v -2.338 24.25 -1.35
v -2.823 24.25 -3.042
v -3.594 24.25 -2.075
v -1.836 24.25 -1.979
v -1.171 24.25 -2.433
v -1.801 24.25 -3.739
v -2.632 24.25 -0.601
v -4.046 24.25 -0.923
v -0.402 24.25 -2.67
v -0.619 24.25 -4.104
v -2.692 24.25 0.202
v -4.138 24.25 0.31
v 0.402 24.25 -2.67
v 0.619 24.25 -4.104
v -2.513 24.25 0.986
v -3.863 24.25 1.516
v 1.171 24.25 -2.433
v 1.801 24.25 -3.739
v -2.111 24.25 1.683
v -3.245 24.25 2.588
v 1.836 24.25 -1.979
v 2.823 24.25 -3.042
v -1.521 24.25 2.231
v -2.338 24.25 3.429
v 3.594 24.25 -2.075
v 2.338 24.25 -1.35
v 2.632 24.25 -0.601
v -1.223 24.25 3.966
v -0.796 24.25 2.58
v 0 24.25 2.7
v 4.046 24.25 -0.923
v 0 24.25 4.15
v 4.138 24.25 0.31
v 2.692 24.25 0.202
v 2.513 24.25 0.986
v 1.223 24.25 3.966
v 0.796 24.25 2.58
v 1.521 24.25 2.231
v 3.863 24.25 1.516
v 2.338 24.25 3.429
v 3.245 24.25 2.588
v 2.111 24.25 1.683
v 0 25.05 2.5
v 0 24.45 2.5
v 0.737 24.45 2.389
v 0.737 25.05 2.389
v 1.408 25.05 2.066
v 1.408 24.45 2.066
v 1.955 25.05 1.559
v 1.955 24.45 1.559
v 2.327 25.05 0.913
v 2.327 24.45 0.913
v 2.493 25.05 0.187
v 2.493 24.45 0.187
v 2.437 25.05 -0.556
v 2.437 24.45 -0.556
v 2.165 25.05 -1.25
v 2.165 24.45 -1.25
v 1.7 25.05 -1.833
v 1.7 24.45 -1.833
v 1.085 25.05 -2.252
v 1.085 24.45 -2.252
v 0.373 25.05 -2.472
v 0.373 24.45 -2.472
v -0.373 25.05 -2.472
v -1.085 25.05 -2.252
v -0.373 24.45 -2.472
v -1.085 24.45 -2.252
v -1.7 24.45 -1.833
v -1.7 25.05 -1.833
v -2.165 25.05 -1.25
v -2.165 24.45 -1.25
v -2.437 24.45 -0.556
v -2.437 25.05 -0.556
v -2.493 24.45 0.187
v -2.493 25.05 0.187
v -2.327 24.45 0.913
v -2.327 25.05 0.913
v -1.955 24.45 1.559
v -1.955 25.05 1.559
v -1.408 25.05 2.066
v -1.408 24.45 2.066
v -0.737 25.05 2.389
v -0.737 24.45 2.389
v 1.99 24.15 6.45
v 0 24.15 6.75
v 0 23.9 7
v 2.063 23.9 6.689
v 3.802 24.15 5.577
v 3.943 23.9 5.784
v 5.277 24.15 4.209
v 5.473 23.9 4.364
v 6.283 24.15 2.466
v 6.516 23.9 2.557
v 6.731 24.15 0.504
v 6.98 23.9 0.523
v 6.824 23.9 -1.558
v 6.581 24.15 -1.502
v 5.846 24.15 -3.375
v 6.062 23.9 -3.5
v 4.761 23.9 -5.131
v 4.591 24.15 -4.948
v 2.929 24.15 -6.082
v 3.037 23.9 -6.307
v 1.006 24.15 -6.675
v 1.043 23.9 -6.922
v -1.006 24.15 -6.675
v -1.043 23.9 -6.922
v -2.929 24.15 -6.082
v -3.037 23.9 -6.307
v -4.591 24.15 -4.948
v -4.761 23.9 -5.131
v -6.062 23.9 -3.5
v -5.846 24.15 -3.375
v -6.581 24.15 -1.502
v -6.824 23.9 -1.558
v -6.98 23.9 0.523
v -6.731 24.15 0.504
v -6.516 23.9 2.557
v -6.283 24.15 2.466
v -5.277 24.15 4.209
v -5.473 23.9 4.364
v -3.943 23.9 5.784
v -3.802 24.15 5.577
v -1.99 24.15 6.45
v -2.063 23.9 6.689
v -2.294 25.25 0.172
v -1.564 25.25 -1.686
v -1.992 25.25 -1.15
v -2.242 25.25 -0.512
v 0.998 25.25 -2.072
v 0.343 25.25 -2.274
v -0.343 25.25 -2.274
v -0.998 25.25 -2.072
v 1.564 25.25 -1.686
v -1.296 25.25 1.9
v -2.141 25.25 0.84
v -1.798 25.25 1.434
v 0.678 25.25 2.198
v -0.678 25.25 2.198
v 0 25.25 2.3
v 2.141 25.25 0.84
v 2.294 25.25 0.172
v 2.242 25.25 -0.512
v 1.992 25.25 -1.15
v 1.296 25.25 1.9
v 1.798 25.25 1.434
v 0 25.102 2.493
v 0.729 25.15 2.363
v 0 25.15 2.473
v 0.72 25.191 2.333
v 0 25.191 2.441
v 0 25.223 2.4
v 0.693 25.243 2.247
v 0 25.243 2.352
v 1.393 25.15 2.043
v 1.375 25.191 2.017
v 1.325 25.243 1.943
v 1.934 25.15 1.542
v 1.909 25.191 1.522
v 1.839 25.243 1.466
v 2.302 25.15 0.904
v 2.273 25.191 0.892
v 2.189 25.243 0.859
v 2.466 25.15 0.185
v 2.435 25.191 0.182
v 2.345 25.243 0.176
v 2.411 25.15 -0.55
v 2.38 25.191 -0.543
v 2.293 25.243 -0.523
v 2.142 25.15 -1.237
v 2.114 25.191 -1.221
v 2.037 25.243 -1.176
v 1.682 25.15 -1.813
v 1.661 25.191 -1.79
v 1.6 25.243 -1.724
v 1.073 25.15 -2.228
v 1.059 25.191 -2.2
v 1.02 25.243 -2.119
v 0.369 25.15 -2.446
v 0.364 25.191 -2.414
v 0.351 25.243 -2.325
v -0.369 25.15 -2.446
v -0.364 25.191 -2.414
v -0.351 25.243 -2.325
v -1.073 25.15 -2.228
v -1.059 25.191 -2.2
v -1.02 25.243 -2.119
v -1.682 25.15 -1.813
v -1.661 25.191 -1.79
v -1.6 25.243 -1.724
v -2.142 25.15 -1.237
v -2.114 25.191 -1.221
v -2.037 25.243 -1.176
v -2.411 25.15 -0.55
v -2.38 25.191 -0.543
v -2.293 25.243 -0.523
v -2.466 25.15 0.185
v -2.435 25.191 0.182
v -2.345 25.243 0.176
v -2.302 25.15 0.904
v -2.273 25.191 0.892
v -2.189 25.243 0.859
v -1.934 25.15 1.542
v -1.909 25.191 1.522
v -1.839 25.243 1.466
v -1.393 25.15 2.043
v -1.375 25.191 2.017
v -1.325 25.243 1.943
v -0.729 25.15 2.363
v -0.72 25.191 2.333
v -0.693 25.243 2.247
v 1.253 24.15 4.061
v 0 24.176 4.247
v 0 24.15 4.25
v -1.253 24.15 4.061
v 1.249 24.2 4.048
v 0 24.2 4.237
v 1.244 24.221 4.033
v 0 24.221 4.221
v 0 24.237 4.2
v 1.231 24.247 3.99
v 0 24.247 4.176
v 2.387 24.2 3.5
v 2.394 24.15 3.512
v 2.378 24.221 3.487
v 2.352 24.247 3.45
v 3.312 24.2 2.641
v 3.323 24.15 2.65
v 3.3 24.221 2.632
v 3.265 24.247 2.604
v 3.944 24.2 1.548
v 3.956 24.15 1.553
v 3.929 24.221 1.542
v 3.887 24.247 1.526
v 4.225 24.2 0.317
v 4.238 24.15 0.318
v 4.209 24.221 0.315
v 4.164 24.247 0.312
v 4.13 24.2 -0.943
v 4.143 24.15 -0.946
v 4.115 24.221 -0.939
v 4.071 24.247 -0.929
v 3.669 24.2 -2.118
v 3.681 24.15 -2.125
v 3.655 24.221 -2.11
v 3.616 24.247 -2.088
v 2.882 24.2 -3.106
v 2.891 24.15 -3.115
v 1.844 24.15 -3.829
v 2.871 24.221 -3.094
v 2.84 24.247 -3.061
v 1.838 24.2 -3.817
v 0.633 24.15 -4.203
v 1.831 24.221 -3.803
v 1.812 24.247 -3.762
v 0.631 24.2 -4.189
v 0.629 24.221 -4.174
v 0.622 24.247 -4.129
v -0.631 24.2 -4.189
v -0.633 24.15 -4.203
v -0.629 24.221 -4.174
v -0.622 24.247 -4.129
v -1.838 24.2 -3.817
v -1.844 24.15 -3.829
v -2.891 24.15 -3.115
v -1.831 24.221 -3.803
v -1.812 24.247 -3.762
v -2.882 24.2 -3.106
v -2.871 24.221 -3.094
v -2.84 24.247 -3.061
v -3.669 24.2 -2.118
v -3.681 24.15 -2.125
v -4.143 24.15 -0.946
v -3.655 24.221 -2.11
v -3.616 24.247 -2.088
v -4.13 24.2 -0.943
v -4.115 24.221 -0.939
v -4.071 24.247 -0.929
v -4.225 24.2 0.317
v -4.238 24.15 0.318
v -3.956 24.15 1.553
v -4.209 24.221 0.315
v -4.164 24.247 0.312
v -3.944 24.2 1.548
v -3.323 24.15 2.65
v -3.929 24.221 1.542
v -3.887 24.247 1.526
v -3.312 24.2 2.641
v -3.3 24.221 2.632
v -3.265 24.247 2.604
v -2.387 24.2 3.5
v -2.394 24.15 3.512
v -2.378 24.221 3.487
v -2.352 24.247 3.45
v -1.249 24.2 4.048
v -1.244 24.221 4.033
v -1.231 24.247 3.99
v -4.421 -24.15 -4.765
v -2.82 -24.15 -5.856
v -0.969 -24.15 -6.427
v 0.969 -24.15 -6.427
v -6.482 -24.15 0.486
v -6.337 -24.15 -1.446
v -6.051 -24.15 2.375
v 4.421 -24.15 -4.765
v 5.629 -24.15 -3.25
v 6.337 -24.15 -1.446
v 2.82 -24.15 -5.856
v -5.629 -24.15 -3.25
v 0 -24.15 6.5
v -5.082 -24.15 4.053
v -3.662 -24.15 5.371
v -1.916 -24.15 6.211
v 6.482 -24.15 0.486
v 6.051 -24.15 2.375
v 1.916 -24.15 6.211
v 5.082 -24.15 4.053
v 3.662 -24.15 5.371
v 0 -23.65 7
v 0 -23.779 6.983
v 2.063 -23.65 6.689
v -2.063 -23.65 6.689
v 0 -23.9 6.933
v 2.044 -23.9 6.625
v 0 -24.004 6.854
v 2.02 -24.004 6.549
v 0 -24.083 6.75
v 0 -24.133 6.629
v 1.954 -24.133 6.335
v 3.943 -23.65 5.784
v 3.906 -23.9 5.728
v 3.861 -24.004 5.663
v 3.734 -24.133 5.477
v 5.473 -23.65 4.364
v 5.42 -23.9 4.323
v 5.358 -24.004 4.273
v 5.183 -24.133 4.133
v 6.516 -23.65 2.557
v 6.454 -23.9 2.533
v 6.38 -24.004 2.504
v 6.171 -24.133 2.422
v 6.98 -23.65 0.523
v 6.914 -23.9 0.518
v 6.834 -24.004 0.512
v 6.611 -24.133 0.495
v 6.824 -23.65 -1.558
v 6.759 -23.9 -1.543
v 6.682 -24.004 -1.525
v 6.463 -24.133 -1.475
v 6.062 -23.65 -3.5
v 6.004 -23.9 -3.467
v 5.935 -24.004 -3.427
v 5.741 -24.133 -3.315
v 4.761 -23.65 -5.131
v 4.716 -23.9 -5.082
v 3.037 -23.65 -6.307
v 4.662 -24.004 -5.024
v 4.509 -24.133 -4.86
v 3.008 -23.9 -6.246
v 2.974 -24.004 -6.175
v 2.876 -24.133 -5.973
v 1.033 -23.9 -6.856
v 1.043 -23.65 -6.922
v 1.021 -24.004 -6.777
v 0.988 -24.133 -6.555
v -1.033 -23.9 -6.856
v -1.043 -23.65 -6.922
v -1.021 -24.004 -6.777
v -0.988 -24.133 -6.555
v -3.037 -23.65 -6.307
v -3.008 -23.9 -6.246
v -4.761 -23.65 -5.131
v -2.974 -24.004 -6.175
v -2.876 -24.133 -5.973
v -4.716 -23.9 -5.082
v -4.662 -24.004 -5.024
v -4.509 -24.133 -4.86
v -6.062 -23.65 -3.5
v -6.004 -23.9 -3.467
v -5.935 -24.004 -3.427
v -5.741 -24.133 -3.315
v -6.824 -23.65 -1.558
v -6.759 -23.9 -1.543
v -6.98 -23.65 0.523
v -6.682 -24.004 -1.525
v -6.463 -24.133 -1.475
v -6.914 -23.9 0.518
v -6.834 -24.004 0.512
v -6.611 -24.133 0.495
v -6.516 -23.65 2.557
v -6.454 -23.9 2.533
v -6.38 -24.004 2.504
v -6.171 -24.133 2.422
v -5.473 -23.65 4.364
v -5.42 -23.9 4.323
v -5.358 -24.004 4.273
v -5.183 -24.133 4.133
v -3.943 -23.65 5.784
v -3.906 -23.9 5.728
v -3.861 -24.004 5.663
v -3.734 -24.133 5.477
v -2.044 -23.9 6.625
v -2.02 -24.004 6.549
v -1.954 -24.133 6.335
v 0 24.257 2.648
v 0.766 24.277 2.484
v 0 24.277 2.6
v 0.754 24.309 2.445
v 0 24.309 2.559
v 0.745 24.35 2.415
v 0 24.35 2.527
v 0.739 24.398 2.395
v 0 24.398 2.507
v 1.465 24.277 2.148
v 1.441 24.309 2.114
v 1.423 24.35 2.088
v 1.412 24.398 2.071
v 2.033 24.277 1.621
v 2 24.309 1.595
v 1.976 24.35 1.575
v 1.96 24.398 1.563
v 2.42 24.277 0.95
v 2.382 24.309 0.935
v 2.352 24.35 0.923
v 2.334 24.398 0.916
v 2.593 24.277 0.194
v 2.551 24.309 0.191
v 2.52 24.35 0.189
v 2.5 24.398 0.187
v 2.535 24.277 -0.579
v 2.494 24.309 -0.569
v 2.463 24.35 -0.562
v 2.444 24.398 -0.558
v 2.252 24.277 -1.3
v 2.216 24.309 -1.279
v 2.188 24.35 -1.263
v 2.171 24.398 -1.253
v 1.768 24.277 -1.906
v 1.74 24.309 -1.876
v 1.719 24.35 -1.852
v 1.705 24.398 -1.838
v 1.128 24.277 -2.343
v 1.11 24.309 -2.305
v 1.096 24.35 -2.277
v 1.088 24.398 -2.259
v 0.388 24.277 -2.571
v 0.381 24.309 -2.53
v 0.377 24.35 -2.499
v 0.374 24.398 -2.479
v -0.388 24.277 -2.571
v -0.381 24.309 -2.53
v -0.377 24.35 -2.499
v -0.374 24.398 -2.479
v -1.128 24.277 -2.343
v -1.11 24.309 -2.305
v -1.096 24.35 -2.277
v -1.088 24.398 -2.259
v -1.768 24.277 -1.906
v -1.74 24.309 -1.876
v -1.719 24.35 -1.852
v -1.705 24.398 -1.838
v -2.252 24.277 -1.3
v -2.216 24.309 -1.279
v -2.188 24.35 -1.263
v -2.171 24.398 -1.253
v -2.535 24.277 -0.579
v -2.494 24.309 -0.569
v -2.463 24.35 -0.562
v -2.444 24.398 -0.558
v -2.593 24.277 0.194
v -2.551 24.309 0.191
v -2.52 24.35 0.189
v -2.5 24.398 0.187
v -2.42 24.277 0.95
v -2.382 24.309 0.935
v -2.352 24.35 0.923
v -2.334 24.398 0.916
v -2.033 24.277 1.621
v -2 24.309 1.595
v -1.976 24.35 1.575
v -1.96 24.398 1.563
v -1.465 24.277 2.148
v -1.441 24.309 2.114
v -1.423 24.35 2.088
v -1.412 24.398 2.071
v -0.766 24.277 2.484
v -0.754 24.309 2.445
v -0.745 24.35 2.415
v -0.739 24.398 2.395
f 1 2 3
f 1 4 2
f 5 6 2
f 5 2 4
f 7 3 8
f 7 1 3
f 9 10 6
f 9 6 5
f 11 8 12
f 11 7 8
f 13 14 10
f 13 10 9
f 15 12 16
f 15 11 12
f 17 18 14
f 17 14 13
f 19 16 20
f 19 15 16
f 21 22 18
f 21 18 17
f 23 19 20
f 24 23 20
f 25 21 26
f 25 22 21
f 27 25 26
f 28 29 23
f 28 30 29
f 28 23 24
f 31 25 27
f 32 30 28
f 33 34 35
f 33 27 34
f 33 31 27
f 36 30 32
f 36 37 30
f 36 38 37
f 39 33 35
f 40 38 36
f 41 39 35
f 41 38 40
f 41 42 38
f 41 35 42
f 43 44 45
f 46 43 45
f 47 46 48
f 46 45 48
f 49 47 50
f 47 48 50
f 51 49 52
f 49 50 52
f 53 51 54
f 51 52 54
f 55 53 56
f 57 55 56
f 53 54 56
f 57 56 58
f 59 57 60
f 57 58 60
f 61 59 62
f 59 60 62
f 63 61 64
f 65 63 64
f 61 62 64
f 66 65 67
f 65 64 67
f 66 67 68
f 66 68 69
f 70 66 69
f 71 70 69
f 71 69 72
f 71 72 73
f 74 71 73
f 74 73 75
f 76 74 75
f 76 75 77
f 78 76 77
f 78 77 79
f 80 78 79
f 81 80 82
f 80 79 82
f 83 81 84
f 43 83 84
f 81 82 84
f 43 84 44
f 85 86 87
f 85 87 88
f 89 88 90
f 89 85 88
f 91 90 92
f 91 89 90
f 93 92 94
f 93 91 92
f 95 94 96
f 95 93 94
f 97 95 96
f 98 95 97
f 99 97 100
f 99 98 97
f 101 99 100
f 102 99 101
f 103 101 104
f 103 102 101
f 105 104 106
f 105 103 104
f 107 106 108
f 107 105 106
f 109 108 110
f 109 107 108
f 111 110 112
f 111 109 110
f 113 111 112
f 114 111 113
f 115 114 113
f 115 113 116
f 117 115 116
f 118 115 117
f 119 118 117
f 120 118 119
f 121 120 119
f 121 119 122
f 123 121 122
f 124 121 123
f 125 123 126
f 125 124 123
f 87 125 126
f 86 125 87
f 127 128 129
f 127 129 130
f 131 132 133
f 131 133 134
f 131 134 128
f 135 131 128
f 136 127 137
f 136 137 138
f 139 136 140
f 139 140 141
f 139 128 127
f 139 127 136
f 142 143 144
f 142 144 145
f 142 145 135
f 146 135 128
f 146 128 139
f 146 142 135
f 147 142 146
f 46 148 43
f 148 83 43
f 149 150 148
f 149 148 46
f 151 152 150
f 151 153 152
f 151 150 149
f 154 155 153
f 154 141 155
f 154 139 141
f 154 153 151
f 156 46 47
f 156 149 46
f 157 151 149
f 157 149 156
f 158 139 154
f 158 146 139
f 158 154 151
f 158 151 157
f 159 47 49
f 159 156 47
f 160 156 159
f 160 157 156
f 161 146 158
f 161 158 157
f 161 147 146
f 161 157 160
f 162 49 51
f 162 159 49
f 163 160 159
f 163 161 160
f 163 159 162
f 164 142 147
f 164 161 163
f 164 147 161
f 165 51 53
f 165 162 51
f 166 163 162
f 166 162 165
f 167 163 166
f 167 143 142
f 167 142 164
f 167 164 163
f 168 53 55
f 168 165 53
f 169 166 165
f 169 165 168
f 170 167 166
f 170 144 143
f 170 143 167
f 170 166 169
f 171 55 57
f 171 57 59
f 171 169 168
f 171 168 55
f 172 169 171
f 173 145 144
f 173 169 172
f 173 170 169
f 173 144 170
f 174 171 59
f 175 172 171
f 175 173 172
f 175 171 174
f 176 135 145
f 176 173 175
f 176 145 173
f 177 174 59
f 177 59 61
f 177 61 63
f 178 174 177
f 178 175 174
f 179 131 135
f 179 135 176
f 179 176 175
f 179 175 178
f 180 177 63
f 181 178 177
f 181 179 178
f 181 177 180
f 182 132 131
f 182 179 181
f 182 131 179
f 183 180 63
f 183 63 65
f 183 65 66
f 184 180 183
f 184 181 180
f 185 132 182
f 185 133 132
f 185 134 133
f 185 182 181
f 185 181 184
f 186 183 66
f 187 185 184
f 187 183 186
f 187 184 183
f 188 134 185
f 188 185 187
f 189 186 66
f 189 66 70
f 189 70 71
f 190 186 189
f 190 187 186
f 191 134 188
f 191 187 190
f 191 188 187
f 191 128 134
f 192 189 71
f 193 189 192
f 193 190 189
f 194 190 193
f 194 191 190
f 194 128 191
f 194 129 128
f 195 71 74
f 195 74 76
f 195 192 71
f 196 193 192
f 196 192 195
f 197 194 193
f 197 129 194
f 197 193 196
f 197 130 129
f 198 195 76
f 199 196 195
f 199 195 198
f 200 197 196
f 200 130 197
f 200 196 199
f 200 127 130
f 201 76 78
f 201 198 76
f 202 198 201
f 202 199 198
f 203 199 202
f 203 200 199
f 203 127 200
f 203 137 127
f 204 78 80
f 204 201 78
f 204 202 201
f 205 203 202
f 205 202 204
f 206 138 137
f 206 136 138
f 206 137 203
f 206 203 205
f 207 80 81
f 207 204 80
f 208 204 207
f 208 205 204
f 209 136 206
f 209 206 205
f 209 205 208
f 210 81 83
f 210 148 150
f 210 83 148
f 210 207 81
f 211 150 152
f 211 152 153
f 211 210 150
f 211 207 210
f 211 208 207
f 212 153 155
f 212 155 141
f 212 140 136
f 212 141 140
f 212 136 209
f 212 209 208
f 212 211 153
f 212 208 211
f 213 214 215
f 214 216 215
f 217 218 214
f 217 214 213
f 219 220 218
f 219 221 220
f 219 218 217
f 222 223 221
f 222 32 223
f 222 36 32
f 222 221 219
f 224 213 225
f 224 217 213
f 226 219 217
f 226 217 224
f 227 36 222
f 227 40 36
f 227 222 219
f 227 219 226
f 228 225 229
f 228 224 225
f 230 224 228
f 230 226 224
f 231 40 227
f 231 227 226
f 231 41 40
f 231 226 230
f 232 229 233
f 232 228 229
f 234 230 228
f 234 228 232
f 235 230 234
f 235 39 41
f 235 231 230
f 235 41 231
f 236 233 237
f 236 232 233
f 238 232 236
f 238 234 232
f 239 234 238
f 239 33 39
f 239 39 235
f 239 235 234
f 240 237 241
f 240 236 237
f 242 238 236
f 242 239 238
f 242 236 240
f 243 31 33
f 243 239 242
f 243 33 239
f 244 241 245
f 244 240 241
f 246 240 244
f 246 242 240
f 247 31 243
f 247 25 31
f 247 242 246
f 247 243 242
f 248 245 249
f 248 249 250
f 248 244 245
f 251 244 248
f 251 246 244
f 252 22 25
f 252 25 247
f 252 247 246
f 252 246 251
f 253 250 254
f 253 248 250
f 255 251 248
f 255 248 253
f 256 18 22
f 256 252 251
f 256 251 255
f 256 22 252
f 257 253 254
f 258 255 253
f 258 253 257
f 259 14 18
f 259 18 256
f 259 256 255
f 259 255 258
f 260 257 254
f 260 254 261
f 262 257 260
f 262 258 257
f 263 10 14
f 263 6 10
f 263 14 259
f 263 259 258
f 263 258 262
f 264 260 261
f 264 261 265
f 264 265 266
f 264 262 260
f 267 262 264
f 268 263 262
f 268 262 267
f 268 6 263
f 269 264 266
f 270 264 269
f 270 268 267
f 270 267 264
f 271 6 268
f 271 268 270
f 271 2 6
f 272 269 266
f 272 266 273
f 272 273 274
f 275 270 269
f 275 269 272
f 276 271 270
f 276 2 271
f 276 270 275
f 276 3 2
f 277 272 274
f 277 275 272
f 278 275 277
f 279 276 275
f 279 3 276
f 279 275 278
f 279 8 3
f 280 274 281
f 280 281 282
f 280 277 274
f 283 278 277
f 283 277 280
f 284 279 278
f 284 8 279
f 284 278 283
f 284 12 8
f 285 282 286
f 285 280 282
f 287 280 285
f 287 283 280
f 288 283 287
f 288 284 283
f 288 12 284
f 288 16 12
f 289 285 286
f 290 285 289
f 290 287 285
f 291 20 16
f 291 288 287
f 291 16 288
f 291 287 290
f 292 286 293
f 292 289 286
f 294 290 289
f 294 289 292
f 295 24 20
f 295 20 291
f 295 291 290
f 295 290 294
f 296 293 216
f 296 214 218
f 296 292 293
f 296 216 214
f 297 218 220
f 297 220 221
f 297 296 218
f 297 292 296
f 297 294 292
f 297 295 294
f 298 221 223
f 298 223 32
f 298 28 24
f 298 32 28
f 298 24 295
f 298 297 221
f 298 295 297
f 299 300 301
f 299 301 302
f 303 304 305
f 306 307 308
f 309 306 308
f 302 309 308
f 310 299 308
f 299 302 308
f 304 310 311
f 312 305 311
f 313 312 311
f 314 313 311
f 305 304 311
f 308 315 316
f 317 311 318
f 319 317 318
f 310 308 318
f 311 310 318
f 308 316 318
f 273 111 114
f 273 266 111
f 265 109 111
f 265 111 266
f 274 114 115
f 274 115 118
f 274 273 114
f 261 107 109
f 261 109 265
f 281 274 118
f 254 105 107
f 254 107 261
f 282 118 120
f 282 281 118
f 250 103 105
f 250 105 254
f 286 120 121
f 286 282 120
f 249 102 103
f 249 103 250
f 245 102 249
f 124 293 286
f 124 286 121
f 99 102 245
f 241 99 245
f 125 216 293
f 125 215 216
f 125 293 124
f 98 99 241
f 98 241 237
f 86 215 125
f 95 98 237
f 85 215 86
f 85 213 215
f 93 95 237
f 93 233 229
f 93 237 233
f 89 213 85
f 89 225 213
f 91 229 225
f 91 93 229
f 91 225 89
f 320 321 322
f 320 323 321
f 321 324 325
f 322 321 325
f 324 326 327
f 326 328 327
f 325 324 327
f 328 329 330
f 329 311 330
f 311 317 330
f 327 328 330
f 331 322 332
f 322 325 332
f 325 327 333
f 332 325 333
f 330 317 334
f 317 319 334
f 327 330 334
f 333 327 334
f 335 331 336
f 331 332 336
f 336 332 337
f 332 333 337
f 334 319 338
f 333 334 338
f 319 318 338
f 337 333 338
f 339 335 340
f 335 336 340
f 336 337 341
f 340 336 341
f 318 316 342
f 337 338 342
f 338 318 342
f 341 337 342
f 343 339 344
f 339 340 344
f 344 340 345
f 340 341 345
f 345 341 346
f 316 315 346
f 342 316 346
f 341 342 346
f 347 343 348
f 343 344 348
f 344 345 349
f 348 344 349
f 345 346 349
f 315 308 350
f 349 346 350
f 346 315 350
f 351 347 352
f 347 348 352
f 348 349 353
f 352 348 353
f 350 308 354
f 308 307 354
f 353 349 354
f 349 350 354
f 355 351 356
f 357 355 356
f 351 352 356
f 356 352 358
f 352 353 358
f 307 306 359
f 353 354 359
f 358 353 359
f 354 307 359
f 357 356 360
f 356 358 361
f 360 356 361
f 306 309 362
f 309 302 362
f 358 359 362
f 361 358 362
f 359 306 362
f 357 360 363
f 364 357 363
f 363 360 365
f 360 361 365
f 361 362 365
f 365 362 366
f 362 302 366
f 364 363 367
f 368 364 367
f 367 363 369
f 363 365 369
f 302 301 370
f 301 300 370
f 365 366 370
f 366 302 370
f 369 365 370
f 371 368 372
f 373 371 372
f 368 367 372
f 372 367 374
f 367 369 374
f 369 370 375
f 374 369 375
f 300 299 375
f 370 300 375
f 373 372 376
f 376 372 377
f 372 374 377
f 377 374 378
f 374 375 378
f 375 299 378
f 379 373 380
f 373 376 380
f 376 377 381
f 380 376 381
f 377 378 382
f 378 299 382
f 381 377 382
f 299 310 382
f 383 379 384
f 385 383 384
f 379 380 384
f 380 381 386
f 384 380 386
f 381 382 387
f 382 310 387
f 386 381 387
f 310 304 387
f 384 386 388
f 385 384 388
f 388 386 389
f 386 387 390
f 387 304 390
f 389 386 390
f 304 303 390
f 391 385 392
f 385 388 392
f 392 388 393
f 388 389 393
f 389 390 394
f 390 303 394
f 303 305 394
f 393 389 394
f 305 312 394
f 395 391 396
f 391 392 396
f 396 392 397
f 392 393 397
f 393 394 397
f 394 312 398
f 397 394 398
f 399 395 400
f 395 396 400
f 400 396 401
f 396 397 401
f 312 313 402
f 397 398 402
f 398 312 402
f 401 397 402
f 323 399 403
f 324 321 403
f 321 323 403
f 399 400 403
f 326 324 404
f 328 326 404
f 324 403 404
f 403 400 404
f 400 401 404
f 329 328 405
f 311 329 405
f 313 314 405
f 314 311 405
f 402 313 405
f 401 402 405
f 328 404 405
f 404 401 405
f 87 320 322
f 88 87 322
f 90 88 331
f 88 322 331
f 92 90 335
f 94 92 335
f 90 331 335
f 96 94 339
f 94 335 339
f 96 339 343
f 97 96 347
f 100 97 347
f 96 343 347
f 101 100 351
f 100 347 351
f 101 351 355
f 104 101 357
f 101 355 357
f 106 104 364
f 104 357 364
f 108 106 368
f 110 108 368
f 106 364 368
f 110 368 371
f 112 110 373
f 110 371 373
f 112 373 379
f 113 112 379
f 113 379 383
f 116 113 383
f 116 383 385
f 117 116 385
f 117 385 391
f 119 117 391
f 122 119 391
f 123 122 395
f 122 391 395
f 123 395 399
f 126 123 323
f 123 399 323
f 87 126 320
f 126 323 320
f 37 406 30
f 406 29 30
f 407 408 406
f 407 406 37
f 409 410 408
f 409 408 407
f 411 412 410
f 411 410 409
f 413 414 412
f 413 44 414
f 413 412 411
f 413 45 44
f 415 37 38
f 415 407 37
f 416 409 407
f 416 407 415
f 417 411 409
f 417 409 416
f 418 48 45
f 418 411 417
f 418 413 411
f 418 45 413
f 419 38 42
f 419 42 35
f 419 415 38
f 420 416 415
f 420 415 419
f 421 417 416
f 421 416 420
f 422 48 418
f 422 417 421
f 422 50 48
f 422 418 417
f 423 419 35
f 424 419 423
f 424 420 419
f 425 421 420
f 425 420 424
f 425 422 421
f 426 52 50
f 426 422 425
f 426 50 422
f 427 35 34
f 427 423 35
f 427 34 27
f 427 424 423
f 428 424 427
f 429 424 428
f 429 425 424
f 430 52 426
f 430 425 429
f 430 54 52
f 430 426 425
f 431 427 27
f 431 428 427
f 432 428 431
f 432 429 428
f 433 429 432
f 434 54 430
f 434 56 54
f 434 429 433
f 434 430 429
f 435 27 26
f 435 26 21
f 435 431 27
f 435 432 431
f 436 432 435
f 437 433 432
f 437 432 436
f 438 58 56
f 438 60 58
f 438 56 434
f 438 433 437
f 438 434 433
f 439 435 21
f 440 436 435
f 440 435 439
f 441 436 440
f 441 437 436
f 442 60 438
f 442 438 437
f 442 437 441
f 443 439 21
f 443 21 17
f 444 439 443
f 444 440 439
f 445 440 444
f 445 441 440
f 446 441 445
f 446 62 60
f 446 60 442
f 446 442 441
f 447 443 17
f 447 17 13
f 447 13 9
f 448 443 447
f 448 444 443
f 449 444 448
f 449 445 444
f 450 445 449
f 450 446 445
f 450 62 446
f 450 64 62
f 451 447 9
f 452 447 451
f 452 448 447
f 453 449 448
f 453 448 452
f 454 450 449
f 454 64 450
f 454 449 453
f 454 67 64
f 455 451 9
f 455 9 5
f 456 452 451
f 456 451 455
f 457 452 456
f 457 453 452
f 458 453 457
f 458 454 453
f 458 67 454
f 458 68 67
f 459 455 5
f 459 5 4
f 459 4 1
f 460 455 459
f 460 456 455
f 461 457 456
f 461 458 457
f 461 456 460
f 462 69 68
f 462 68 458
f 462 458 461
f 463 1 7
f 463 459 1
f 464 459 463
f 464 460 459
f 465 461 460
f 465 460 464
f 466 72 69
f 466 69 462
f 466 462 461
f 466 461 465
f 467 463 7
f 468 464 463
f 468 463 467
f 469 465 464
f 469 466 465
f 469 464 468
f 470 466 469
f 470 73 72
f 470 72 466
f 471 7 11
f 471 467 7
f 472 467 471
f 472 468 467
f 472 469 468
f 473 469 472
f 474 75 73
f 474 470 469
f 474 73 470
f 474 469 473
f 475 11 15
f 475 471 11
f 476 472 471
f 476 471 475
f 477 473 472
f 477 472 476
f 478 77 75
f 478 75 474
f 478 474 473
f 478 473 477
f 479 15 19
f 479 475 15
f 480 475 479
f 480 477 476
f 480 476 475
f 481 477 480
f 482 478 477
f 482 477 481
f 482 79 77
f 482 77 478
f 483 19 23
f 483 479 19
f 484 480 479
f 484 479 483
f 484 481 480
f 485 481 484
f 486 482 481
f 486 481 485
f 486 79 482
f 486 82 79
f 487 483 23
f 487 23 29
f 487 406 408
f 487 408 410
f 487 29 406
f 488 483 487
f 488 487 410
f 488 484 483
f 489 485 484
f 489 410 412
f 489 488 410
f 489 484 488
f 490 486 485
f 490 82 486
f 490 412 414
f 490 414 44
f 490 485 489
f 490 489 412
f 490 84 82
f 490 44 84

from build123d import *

# Parameters (mm, degrees)
BOSS_EXTRUDE1_DEPTH      = 24.15
BOSS_EXTRUDE1_DEPTH_BACK = 24.15
SKETCH1_R                = 7
FILLET1_R                = 0.5
CHAMFER1_SIZE            = 0.25
SKETCH2_R                = 4.25
BOSS_EXTRUDE2_DEPTH      = 0.1
FILLET2_R                = 0.1
SKETCH3_R                = 2.5
BOSS_EXTRUDE3_DEPTH      = 1
FILLET3_R                = 0.2
FILLET4_R                = 0.2


with BuildPart() as part:
    # Sketch1 → Boss-Extrude1 (new, two sides: drawn at the far end of the back side and taken through both)
    with BuildSketch(Plane(origin=(0, 0, 0), x_dir=(1, 0, 0), z_dir=(0, 1, 0)).offset(-BOSS_EXTRUDE1_DEPTH_BACK)):
        with Locations(Location((0, 0, 0), (0, 0, 270))):
            Circle(SKETCH1_R)
    extrude(amount=BOSS_EXTRUDE1_DEPTH + BOSS_EXTRUDE1_DEPTH_BACK)

    # Fillet1
    fillet1_edges = [part.edges().sort_by_distance(p)[0] for p in [
        (0, -24.15, -7),
    ]]
    fillet(fillet1_edges, radius=FILLET1_R)

    # Chamfer1
    chamfer1_edges = [part.edges().sort_by_distance(p)[0] for p in [
        (0, 24.15, -7),
    ]]
    chamfer(chamfer1_edges, length=CHAMFER1_SIZE)

    # Sketch2 → Boss-Extrude2 (add)
    with BuildSketch(Plane(origin=(0, 24.15, 0), x_dir=(1, 0, 0), z_dir=(0, 1, 0))):
        with Locations(Location((0, 0, 0), (0, 0, 270))):
            Circle(SKETCH2_R)
    extrude(amount=BOSS_EXTRUDE2_DEPTH)

    # Fillet2
    fillet2_edges = [part.edges().sort_by_distance(p)[0] for p in [
        (0, 24.25, -4.25),
    ]]
    fillet(fillet2_edges, radius=FILLET2_R - 0.0001)  # a hair under: the kernel refuses the full size

    # Sketch3 → Boss-Extrude3 (add)
    with BuildSketch(Plane(origin=(0, 24.25, 0), x_dir=(1, 0, 0), z_dir=(0, 1, 0))):
        with Locations(Location((0, 0, 0), (0, 0, 270))):
            Circle(SKETCH3_R)
    extrude(amount=BOSS_EXTRUDE3_DEPTH)

    # Fillet3
    fillet3_edges = [part.edges().sort_by_distance(p)[0] for p in [
        (0, 24.25, -2.5),
    ]]
    fillet(fillet3_edges, radius=FILLET3_R)

    # Fillet4
    fillet4_edges = [part.edges().sort_by_distance(p)[0] for p in [
        (0, 25.25, -2.5),
    ]]
    fillet(fillet4_edges, radius=FILLET4_R)


solid = part.part
